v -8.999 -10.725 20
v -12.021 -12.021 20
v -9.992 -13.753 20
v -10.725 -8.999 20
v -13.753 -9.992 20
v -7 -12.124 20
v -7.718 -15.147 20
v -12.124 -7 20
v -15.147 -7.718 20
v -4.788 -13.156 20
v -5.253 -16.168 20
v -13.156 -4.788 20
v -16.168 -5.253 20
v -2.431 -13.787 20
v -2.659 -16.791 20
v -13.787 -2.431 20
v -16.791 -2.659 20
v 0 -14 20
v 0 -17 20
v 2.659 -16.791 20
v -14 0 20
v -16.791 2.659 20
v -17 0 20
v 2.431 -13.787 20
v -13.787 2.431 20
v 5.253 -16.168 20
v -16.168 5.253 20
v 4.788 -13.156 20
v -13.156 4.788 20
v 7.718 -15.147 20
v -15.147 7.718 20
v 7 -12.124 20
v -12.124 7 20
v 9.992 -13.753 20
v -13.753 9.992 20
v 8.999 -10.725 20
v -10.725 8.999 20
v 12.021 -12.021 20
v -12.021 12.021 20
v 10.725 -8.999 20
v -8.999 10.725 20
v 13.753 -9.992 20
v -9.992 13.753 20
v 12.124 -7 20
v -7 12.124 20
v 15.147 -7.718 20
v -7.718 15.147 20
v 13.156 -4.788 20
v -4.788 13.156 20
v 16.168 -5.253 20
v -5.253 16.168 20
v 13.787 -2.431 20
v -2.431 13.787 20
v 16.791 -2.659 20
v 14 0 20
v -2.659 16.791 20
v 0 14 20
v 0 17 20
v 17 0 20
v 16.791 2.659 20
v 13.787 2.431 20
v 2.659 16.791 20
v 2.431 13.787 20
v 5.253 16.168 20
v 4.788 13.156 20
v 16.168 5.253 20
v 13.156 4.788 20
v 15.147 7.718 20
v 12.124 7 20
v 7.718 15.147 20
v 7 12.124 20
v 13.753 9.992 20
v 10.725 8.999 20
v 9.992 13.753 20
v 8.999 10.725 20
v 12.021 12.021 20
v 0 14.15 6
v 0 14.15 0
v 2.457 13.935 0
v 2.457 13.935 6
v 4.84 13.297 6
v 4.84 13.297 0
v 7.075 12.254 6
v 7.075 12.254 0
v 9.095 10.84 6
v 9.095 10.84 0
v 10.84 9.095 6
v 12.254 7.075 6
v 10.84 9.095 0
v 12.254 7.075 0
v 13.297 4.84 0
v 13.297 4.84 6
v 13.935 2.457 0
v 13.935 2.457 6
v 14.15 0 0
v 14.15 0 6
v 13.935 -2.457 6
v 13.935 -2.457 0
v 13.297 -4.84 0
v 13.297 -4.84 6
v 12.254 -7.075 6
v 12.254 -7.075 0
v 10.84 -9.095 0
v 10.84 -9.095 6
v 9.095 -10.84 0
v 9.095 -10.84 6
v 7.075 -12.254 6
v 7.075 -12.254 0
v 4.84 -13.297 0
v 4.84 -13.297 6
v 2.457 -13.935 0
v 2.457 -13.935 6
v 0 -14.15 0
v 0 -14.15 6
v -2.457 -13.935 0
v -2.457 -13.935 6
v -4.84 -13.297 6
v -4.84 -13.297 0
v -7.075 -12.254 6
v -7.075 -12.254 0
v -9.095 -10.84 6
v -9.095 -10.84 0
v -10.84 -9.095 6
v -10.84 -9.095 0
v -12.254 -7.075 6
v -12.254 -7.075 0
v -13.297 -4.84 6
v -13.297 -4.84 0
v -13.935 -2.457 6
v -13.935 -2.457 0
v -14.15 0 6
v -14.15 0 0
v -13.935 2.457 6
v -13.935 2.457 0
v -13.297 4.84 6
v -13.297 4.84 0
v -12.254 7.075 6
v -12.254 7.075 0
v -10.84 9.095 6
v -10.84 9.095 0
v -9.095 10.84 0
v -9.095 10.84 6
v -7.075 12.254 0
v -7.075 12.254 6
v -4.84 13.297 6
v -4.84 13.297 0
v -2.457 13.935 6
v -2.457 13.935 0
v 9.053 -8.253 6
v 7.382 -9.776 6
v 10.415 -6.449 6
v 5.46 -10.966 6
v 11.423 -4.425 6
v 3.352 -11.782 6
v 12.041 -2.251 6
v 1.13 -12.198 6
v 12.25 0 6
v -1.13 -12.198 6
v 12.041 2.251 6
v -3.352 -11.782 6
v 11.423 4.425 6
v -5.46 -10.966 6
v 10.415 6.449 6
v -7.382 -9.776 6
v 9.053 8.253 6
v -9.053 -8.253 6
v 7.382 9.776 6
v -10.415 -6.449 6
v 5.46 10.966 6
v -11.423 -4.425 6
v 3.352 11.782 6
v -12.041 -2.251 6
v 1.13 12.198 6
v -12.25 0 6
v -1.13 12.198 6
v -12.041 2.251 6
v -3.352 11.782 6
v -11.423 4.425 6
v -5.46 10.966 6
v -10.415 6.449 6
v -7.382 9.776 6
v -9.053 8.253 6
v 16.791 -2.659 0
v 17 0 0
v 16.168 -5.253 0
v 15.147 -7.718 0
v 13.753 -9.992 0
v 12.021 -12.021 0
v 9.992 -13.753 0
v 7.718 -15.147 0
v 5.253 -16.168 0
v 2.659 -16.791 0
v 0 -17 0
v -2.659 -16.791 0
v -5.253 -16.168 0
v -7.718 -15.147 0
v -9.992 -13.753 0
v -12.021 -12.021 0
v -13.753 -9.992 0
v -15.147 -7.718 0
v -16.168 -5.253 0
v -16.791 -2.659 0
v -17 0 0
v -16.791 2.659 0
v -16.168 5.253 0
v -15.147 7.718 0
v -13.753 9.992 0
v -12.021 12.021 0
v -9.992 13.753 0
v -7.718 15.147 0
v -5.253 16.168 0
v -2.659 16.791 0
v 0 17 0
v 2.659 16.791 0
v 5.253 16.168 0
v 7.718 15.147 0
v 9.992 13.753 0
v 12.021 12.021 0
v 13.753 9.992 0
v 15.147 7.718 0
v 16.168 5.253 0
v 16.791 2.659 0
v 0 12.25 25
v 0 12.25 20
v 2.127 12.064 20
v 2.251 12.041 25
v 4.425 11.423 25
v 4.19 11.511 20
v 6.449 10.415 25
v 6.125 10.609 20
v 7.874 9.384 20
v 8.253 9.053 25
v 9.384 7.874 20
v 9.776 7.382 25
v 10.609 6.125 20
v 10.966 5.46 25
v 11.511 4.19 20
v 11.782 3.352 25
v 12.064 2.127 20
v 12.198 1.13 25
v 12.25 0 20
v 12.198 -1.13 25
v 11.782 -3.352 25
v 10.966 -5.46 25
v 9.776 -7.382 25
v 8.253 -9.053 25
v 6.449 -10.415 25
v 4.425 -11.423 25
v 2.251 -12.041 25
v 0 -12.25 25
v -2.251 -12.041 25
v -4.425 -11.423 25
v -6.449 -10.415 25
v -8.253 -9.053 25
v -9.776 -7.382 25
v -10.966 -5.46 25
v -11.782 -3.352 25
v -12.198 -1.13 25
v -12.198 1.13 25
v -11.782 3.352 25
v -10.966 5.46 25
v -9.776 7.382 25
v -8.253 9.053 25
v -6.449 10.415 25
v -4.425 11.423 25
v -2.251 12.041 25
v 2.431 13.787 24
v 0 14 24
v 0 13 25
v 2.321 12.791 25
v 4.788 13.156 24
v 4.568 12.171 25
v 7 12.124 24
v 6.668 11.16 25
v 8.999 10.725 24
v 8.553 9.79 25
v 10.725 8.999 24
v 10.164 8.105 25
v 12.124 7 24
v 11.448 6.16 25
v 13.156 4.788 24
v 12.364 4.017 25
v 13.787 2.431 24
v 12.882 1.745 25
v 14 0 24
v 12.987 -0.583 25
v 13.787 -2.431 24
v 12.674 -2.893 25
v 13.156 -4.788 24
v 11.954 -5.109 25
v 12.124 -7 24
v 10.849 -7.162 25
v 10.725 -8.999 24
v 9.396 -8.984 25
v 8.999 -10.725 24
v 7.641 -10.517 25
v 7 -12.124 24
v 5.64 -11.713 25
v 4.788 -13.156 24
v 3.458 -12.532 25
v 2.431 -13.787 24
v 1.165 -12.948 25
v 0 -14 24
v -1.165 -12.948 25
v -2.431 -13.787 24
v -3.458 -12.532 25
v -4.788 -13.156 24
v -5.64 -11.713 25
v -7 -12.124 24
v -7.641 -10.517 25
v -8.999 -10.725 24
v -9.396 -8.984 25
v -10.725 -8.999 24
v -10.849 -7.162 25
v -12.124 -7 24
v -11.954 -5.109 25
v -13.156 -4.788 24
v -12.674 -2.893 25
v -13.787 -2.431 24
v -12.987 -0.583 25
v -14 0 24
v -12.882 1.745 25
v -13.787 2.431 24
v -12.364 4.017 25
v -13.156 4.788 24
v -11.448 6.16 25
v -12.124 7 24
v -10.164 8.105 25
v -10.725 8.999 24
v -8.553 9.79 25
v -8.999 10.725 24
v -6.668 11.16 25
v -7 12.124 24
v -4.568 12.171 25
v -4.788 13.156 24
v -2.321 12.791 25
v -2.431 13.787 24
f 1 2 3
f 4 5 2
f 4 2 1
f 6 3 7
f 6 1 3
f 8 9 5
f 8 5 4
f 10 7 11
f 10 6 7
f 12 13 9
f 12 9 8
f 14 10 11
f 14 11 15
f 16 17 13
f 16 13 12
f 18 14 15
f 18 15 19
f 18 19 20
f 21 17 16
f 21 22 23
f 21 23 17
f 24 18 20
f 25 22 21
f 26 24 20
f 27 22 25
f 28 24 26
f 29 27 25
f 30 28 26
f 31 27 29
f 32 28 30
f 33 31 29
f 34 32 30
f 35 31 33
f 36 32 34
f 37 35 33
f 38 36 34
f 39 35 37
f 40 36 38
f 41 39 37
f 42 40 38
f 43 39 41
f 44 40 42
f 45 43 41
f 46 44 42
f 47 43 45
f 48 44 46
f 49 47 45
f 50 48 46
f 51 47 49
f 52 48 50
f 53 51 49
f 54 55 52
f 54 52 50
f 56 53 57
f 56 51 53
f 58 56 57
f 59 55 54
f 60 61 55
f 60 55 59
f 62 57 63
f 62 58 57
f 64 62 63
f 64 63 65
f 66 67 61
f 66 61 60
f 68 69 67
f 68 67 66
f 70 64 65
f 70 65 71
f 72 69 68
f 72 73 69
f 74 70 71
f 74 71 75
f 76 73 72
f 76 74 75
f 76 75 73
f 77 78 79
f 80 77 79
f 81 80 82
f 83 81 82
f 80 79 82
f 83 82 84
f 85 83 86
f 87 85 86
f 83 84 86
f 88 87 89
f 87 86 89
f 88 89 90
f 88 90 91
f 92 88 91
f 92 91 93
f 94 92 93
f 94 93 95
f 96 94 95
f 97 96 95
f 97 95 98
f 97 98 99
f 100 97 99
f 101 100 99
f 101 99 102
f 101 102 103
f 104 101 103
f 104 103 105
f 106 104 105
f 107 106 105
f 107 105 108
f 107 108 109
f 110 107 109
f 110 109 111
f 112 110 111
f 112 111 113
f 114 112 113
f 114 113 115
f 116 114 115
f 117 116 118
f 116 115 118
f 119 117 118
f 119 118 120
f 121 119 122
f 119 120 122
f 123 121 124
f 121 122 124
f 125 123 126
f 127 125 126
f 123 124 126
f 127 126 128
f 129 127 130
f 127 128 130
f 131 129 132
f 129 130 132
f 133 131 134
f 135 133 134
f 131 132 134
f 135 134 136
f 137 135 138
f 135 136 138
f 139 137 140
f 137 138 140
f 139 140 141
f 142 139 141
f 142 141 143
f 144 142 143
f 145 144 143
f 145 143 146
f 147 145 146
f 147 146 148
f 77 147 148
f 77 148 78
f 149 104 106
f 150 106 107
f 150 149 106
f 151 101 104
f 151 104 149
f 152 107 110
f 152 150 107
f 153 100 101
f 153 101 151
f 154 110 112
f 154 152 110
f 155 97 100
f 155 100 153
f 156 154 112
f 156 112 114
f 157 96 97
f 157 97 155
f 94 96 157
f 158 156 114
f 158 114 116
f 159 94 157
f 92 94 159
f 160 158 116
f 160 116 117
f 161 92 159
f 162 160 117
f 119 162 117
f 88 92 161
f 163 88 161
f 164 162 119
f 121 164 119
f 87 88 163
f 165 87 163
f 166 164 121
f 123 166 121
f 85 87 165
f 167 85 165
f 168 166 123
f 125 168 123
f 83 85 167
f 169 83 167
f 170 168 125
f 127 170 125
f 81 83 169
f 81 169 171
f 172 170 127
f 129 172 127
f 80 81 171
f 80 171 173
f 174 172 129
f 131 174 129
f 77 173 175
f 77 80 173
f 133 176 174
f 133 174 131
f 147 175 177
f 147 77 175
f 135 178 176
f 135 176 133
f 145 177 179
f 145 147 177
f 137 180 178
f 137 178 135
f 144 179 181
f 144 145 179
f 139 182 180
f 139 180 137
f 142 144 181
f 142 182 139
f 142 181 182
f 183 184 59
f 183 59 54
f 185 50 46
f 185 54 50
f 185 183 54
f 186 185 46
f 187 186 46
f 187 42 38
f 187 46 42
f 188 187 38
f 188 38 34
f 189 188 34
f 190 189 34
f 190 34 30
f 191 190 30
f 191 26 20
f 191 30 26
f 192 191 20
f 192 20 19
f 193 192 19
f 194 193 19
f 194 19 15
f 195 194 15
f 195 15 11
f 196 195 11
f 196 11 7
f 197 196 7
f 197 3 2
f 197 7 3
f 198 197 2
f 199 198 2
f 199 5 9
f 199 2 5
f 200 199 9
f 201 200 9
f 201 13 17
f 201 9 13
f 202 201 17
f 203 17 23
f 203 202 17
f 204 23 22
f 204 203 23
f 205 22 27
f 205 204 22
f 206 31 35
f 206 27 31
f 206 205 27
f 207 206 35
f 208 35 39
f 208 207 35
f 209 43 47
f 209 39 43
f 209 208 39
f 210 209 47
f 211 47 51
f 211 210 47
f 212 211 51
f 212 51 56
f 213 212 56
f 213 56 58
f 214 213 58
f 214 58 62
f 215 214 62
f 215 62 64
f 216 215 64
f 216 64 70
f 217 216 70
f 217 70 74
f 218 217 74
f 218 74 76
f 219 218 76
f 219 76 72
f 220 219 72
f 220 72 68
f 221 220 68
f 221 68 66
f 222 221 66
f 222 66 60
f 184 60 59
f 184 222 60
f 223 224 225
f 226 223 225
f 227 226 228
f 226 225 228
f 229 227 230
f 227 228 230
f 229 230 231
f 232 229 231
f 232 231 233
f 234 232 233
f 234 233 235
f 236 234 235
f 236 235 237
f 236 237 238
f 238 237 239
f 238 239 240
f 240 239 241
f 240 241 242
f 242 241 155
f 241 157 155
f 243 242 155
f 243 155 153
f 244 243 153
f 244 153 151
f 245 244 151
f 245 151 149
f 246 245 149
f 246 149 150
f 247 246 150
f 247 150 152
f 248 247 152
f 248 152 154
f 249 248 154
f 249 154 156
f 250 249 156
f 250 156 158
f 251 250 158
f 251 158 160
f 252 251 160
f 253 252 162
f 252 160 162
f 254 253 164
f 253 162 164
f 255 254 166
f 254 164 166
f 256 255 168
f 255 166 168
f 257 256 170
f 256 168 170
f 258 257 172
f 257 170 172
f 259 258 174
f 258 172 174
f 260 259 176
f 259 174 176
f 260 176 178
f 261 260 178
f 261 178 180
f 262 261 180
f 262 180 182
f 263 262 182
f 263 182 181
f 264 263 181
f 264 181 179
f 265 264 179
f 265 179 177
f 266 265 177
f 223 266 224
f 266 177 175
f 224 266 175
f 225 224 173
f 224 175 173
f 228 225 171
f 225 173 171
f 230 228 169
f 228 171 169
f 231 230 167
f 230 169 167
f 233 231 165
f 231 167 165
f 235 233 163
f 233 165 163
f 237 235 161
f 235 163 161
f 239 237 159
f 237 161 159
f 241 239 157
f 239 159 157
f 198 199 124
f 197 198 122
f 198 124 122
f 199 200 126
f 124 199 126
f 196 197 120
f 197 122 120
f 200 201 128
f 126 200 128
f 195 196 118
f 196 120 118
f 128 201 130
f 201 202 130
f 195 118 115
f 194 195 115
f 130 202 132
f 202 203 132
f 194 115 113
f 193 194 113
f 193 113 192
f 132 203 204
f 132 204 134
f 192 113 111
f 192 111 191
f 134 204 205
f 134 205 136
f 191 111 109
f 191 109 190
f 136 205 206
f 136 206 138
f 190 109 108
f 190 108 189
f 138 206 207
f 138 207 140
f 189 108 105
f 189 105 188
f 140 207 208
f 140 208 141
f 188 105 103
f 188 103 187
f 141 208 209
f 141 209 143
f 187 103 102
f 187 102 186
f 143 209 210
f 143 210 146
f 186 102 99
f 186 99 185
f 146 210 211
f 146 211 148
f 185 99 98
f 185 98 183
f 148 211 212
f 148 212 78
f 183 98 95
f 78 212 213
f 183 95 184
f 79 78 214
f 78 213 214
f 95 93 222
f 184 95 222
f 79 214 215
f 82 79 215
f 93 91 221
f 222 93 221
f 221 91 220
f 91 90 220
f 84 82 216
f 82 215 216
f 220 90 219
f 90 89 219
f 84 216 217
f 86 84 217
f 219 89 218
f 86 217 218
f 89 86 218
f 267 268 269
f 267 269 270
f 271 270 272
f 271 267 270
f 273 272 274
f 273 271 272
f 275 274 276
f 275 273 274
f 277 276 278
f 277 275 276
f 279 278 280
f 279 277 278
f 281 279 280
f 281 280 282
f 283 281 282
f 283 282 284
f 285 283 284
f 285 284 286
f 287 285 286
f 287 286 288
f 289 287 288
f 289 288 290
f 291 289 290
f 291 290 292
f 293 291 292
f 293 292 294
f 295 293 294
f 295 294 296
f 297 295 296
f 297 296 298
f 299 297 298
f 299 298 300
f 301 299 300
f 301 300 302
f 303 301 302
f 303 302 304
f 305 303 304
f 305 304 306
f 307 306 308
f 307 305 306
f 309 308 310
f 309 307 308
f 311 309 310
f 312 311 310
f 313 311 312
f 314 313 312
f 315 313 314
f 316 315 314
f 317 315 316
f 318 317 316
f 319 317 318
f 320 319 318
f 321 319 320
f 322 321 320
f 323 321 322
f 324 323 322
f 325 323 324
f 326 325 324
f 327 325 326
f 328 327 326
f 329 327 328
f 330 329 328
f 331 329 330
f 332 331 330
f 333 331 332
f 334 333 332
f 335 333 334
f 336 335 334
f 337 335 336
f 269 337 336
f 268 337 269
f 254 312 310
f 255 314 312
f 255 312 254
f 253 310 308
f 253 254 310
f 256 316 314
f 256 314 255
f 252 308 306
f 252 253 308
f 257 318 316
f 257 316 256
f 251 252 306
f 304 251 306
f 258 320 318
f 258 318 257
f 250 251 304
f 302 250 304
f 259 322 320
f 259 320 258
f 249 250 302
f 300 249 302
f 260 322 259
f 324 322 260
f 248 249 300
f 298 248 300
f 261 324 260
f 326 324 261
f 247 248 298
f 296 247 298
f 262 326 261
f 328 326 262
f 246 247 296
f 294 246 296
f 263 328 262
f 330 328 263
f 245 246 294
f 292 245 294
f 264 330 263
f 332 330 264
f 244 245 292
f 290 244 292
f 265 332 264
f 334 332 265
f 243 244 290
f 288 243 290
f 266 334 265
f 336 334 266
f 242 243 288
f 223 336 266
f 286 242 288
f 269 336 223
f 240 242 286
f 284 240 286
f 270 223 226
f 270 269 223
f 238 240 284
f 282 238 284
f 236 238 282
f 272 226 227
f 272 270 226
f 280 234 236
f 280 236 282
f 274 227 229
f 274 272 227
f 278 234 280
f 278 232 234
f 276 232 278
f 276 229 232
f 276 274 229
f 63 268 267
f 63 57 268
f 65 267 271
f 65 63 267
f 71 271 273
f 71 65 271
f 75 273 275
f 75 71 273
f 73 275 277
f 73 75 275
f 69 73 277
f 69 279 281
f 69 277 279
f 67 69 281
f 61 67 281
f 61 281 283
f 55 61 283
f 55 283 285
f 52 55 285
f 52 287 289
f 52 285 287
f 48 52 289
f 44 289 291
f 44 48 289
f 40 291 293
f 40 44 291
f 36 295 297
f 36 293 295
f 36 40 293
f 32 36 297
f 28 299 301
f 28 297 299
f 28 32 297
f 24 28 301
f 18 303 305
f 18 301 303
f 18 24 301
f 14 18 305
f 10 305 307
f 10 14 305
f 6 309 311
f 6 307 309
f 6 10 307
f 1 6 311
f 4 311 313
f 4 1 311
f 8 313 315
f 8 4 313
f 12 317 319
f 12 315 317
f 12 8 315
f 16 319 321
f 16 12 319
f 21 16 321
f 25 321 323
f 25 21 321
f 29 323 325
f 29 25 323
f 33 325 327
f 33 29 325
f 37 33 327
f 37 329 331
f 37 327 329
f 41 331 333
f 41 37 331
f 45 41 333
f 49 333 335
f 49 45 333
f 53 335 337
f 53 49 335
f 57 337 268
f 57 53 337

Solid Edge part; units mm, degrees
sketch "Sketch1" plane through (0, 0, 0) normal (0, 0, 1) x (1, 0, 0)
  circle A0 centre (0, 0) radius 17
  circle A1 centre (0, 0) radius 12.25
extrude "Protrusion1" add sketch "Sketch1" along normal blind 20
sketch "Sketch2" plane through (0, 0, 20) normal (0, 0, 1) x (0, 1, 0)
  circle A0 centre (0, 0) radius 12.25
  circle A1 centre (0, 0) radius 14
extrude "Extrusionsausprägung_2" add sketch "Sketch2" along normal blind 5
chamfer "Fase_1" distance 1 angle 45 1 edges at (0, -14, 25)
sketch "Sketch3" plane through (0, 0, 0) normal (0, 0, -1) x (0, 1, 0)
  circle A0 centre (0, 0) radius 14.15
  dimension "D1" = 28.3
extrude "Extrusionsausschnitt_1" cut sketch "Sketch3" against normal blind 6
